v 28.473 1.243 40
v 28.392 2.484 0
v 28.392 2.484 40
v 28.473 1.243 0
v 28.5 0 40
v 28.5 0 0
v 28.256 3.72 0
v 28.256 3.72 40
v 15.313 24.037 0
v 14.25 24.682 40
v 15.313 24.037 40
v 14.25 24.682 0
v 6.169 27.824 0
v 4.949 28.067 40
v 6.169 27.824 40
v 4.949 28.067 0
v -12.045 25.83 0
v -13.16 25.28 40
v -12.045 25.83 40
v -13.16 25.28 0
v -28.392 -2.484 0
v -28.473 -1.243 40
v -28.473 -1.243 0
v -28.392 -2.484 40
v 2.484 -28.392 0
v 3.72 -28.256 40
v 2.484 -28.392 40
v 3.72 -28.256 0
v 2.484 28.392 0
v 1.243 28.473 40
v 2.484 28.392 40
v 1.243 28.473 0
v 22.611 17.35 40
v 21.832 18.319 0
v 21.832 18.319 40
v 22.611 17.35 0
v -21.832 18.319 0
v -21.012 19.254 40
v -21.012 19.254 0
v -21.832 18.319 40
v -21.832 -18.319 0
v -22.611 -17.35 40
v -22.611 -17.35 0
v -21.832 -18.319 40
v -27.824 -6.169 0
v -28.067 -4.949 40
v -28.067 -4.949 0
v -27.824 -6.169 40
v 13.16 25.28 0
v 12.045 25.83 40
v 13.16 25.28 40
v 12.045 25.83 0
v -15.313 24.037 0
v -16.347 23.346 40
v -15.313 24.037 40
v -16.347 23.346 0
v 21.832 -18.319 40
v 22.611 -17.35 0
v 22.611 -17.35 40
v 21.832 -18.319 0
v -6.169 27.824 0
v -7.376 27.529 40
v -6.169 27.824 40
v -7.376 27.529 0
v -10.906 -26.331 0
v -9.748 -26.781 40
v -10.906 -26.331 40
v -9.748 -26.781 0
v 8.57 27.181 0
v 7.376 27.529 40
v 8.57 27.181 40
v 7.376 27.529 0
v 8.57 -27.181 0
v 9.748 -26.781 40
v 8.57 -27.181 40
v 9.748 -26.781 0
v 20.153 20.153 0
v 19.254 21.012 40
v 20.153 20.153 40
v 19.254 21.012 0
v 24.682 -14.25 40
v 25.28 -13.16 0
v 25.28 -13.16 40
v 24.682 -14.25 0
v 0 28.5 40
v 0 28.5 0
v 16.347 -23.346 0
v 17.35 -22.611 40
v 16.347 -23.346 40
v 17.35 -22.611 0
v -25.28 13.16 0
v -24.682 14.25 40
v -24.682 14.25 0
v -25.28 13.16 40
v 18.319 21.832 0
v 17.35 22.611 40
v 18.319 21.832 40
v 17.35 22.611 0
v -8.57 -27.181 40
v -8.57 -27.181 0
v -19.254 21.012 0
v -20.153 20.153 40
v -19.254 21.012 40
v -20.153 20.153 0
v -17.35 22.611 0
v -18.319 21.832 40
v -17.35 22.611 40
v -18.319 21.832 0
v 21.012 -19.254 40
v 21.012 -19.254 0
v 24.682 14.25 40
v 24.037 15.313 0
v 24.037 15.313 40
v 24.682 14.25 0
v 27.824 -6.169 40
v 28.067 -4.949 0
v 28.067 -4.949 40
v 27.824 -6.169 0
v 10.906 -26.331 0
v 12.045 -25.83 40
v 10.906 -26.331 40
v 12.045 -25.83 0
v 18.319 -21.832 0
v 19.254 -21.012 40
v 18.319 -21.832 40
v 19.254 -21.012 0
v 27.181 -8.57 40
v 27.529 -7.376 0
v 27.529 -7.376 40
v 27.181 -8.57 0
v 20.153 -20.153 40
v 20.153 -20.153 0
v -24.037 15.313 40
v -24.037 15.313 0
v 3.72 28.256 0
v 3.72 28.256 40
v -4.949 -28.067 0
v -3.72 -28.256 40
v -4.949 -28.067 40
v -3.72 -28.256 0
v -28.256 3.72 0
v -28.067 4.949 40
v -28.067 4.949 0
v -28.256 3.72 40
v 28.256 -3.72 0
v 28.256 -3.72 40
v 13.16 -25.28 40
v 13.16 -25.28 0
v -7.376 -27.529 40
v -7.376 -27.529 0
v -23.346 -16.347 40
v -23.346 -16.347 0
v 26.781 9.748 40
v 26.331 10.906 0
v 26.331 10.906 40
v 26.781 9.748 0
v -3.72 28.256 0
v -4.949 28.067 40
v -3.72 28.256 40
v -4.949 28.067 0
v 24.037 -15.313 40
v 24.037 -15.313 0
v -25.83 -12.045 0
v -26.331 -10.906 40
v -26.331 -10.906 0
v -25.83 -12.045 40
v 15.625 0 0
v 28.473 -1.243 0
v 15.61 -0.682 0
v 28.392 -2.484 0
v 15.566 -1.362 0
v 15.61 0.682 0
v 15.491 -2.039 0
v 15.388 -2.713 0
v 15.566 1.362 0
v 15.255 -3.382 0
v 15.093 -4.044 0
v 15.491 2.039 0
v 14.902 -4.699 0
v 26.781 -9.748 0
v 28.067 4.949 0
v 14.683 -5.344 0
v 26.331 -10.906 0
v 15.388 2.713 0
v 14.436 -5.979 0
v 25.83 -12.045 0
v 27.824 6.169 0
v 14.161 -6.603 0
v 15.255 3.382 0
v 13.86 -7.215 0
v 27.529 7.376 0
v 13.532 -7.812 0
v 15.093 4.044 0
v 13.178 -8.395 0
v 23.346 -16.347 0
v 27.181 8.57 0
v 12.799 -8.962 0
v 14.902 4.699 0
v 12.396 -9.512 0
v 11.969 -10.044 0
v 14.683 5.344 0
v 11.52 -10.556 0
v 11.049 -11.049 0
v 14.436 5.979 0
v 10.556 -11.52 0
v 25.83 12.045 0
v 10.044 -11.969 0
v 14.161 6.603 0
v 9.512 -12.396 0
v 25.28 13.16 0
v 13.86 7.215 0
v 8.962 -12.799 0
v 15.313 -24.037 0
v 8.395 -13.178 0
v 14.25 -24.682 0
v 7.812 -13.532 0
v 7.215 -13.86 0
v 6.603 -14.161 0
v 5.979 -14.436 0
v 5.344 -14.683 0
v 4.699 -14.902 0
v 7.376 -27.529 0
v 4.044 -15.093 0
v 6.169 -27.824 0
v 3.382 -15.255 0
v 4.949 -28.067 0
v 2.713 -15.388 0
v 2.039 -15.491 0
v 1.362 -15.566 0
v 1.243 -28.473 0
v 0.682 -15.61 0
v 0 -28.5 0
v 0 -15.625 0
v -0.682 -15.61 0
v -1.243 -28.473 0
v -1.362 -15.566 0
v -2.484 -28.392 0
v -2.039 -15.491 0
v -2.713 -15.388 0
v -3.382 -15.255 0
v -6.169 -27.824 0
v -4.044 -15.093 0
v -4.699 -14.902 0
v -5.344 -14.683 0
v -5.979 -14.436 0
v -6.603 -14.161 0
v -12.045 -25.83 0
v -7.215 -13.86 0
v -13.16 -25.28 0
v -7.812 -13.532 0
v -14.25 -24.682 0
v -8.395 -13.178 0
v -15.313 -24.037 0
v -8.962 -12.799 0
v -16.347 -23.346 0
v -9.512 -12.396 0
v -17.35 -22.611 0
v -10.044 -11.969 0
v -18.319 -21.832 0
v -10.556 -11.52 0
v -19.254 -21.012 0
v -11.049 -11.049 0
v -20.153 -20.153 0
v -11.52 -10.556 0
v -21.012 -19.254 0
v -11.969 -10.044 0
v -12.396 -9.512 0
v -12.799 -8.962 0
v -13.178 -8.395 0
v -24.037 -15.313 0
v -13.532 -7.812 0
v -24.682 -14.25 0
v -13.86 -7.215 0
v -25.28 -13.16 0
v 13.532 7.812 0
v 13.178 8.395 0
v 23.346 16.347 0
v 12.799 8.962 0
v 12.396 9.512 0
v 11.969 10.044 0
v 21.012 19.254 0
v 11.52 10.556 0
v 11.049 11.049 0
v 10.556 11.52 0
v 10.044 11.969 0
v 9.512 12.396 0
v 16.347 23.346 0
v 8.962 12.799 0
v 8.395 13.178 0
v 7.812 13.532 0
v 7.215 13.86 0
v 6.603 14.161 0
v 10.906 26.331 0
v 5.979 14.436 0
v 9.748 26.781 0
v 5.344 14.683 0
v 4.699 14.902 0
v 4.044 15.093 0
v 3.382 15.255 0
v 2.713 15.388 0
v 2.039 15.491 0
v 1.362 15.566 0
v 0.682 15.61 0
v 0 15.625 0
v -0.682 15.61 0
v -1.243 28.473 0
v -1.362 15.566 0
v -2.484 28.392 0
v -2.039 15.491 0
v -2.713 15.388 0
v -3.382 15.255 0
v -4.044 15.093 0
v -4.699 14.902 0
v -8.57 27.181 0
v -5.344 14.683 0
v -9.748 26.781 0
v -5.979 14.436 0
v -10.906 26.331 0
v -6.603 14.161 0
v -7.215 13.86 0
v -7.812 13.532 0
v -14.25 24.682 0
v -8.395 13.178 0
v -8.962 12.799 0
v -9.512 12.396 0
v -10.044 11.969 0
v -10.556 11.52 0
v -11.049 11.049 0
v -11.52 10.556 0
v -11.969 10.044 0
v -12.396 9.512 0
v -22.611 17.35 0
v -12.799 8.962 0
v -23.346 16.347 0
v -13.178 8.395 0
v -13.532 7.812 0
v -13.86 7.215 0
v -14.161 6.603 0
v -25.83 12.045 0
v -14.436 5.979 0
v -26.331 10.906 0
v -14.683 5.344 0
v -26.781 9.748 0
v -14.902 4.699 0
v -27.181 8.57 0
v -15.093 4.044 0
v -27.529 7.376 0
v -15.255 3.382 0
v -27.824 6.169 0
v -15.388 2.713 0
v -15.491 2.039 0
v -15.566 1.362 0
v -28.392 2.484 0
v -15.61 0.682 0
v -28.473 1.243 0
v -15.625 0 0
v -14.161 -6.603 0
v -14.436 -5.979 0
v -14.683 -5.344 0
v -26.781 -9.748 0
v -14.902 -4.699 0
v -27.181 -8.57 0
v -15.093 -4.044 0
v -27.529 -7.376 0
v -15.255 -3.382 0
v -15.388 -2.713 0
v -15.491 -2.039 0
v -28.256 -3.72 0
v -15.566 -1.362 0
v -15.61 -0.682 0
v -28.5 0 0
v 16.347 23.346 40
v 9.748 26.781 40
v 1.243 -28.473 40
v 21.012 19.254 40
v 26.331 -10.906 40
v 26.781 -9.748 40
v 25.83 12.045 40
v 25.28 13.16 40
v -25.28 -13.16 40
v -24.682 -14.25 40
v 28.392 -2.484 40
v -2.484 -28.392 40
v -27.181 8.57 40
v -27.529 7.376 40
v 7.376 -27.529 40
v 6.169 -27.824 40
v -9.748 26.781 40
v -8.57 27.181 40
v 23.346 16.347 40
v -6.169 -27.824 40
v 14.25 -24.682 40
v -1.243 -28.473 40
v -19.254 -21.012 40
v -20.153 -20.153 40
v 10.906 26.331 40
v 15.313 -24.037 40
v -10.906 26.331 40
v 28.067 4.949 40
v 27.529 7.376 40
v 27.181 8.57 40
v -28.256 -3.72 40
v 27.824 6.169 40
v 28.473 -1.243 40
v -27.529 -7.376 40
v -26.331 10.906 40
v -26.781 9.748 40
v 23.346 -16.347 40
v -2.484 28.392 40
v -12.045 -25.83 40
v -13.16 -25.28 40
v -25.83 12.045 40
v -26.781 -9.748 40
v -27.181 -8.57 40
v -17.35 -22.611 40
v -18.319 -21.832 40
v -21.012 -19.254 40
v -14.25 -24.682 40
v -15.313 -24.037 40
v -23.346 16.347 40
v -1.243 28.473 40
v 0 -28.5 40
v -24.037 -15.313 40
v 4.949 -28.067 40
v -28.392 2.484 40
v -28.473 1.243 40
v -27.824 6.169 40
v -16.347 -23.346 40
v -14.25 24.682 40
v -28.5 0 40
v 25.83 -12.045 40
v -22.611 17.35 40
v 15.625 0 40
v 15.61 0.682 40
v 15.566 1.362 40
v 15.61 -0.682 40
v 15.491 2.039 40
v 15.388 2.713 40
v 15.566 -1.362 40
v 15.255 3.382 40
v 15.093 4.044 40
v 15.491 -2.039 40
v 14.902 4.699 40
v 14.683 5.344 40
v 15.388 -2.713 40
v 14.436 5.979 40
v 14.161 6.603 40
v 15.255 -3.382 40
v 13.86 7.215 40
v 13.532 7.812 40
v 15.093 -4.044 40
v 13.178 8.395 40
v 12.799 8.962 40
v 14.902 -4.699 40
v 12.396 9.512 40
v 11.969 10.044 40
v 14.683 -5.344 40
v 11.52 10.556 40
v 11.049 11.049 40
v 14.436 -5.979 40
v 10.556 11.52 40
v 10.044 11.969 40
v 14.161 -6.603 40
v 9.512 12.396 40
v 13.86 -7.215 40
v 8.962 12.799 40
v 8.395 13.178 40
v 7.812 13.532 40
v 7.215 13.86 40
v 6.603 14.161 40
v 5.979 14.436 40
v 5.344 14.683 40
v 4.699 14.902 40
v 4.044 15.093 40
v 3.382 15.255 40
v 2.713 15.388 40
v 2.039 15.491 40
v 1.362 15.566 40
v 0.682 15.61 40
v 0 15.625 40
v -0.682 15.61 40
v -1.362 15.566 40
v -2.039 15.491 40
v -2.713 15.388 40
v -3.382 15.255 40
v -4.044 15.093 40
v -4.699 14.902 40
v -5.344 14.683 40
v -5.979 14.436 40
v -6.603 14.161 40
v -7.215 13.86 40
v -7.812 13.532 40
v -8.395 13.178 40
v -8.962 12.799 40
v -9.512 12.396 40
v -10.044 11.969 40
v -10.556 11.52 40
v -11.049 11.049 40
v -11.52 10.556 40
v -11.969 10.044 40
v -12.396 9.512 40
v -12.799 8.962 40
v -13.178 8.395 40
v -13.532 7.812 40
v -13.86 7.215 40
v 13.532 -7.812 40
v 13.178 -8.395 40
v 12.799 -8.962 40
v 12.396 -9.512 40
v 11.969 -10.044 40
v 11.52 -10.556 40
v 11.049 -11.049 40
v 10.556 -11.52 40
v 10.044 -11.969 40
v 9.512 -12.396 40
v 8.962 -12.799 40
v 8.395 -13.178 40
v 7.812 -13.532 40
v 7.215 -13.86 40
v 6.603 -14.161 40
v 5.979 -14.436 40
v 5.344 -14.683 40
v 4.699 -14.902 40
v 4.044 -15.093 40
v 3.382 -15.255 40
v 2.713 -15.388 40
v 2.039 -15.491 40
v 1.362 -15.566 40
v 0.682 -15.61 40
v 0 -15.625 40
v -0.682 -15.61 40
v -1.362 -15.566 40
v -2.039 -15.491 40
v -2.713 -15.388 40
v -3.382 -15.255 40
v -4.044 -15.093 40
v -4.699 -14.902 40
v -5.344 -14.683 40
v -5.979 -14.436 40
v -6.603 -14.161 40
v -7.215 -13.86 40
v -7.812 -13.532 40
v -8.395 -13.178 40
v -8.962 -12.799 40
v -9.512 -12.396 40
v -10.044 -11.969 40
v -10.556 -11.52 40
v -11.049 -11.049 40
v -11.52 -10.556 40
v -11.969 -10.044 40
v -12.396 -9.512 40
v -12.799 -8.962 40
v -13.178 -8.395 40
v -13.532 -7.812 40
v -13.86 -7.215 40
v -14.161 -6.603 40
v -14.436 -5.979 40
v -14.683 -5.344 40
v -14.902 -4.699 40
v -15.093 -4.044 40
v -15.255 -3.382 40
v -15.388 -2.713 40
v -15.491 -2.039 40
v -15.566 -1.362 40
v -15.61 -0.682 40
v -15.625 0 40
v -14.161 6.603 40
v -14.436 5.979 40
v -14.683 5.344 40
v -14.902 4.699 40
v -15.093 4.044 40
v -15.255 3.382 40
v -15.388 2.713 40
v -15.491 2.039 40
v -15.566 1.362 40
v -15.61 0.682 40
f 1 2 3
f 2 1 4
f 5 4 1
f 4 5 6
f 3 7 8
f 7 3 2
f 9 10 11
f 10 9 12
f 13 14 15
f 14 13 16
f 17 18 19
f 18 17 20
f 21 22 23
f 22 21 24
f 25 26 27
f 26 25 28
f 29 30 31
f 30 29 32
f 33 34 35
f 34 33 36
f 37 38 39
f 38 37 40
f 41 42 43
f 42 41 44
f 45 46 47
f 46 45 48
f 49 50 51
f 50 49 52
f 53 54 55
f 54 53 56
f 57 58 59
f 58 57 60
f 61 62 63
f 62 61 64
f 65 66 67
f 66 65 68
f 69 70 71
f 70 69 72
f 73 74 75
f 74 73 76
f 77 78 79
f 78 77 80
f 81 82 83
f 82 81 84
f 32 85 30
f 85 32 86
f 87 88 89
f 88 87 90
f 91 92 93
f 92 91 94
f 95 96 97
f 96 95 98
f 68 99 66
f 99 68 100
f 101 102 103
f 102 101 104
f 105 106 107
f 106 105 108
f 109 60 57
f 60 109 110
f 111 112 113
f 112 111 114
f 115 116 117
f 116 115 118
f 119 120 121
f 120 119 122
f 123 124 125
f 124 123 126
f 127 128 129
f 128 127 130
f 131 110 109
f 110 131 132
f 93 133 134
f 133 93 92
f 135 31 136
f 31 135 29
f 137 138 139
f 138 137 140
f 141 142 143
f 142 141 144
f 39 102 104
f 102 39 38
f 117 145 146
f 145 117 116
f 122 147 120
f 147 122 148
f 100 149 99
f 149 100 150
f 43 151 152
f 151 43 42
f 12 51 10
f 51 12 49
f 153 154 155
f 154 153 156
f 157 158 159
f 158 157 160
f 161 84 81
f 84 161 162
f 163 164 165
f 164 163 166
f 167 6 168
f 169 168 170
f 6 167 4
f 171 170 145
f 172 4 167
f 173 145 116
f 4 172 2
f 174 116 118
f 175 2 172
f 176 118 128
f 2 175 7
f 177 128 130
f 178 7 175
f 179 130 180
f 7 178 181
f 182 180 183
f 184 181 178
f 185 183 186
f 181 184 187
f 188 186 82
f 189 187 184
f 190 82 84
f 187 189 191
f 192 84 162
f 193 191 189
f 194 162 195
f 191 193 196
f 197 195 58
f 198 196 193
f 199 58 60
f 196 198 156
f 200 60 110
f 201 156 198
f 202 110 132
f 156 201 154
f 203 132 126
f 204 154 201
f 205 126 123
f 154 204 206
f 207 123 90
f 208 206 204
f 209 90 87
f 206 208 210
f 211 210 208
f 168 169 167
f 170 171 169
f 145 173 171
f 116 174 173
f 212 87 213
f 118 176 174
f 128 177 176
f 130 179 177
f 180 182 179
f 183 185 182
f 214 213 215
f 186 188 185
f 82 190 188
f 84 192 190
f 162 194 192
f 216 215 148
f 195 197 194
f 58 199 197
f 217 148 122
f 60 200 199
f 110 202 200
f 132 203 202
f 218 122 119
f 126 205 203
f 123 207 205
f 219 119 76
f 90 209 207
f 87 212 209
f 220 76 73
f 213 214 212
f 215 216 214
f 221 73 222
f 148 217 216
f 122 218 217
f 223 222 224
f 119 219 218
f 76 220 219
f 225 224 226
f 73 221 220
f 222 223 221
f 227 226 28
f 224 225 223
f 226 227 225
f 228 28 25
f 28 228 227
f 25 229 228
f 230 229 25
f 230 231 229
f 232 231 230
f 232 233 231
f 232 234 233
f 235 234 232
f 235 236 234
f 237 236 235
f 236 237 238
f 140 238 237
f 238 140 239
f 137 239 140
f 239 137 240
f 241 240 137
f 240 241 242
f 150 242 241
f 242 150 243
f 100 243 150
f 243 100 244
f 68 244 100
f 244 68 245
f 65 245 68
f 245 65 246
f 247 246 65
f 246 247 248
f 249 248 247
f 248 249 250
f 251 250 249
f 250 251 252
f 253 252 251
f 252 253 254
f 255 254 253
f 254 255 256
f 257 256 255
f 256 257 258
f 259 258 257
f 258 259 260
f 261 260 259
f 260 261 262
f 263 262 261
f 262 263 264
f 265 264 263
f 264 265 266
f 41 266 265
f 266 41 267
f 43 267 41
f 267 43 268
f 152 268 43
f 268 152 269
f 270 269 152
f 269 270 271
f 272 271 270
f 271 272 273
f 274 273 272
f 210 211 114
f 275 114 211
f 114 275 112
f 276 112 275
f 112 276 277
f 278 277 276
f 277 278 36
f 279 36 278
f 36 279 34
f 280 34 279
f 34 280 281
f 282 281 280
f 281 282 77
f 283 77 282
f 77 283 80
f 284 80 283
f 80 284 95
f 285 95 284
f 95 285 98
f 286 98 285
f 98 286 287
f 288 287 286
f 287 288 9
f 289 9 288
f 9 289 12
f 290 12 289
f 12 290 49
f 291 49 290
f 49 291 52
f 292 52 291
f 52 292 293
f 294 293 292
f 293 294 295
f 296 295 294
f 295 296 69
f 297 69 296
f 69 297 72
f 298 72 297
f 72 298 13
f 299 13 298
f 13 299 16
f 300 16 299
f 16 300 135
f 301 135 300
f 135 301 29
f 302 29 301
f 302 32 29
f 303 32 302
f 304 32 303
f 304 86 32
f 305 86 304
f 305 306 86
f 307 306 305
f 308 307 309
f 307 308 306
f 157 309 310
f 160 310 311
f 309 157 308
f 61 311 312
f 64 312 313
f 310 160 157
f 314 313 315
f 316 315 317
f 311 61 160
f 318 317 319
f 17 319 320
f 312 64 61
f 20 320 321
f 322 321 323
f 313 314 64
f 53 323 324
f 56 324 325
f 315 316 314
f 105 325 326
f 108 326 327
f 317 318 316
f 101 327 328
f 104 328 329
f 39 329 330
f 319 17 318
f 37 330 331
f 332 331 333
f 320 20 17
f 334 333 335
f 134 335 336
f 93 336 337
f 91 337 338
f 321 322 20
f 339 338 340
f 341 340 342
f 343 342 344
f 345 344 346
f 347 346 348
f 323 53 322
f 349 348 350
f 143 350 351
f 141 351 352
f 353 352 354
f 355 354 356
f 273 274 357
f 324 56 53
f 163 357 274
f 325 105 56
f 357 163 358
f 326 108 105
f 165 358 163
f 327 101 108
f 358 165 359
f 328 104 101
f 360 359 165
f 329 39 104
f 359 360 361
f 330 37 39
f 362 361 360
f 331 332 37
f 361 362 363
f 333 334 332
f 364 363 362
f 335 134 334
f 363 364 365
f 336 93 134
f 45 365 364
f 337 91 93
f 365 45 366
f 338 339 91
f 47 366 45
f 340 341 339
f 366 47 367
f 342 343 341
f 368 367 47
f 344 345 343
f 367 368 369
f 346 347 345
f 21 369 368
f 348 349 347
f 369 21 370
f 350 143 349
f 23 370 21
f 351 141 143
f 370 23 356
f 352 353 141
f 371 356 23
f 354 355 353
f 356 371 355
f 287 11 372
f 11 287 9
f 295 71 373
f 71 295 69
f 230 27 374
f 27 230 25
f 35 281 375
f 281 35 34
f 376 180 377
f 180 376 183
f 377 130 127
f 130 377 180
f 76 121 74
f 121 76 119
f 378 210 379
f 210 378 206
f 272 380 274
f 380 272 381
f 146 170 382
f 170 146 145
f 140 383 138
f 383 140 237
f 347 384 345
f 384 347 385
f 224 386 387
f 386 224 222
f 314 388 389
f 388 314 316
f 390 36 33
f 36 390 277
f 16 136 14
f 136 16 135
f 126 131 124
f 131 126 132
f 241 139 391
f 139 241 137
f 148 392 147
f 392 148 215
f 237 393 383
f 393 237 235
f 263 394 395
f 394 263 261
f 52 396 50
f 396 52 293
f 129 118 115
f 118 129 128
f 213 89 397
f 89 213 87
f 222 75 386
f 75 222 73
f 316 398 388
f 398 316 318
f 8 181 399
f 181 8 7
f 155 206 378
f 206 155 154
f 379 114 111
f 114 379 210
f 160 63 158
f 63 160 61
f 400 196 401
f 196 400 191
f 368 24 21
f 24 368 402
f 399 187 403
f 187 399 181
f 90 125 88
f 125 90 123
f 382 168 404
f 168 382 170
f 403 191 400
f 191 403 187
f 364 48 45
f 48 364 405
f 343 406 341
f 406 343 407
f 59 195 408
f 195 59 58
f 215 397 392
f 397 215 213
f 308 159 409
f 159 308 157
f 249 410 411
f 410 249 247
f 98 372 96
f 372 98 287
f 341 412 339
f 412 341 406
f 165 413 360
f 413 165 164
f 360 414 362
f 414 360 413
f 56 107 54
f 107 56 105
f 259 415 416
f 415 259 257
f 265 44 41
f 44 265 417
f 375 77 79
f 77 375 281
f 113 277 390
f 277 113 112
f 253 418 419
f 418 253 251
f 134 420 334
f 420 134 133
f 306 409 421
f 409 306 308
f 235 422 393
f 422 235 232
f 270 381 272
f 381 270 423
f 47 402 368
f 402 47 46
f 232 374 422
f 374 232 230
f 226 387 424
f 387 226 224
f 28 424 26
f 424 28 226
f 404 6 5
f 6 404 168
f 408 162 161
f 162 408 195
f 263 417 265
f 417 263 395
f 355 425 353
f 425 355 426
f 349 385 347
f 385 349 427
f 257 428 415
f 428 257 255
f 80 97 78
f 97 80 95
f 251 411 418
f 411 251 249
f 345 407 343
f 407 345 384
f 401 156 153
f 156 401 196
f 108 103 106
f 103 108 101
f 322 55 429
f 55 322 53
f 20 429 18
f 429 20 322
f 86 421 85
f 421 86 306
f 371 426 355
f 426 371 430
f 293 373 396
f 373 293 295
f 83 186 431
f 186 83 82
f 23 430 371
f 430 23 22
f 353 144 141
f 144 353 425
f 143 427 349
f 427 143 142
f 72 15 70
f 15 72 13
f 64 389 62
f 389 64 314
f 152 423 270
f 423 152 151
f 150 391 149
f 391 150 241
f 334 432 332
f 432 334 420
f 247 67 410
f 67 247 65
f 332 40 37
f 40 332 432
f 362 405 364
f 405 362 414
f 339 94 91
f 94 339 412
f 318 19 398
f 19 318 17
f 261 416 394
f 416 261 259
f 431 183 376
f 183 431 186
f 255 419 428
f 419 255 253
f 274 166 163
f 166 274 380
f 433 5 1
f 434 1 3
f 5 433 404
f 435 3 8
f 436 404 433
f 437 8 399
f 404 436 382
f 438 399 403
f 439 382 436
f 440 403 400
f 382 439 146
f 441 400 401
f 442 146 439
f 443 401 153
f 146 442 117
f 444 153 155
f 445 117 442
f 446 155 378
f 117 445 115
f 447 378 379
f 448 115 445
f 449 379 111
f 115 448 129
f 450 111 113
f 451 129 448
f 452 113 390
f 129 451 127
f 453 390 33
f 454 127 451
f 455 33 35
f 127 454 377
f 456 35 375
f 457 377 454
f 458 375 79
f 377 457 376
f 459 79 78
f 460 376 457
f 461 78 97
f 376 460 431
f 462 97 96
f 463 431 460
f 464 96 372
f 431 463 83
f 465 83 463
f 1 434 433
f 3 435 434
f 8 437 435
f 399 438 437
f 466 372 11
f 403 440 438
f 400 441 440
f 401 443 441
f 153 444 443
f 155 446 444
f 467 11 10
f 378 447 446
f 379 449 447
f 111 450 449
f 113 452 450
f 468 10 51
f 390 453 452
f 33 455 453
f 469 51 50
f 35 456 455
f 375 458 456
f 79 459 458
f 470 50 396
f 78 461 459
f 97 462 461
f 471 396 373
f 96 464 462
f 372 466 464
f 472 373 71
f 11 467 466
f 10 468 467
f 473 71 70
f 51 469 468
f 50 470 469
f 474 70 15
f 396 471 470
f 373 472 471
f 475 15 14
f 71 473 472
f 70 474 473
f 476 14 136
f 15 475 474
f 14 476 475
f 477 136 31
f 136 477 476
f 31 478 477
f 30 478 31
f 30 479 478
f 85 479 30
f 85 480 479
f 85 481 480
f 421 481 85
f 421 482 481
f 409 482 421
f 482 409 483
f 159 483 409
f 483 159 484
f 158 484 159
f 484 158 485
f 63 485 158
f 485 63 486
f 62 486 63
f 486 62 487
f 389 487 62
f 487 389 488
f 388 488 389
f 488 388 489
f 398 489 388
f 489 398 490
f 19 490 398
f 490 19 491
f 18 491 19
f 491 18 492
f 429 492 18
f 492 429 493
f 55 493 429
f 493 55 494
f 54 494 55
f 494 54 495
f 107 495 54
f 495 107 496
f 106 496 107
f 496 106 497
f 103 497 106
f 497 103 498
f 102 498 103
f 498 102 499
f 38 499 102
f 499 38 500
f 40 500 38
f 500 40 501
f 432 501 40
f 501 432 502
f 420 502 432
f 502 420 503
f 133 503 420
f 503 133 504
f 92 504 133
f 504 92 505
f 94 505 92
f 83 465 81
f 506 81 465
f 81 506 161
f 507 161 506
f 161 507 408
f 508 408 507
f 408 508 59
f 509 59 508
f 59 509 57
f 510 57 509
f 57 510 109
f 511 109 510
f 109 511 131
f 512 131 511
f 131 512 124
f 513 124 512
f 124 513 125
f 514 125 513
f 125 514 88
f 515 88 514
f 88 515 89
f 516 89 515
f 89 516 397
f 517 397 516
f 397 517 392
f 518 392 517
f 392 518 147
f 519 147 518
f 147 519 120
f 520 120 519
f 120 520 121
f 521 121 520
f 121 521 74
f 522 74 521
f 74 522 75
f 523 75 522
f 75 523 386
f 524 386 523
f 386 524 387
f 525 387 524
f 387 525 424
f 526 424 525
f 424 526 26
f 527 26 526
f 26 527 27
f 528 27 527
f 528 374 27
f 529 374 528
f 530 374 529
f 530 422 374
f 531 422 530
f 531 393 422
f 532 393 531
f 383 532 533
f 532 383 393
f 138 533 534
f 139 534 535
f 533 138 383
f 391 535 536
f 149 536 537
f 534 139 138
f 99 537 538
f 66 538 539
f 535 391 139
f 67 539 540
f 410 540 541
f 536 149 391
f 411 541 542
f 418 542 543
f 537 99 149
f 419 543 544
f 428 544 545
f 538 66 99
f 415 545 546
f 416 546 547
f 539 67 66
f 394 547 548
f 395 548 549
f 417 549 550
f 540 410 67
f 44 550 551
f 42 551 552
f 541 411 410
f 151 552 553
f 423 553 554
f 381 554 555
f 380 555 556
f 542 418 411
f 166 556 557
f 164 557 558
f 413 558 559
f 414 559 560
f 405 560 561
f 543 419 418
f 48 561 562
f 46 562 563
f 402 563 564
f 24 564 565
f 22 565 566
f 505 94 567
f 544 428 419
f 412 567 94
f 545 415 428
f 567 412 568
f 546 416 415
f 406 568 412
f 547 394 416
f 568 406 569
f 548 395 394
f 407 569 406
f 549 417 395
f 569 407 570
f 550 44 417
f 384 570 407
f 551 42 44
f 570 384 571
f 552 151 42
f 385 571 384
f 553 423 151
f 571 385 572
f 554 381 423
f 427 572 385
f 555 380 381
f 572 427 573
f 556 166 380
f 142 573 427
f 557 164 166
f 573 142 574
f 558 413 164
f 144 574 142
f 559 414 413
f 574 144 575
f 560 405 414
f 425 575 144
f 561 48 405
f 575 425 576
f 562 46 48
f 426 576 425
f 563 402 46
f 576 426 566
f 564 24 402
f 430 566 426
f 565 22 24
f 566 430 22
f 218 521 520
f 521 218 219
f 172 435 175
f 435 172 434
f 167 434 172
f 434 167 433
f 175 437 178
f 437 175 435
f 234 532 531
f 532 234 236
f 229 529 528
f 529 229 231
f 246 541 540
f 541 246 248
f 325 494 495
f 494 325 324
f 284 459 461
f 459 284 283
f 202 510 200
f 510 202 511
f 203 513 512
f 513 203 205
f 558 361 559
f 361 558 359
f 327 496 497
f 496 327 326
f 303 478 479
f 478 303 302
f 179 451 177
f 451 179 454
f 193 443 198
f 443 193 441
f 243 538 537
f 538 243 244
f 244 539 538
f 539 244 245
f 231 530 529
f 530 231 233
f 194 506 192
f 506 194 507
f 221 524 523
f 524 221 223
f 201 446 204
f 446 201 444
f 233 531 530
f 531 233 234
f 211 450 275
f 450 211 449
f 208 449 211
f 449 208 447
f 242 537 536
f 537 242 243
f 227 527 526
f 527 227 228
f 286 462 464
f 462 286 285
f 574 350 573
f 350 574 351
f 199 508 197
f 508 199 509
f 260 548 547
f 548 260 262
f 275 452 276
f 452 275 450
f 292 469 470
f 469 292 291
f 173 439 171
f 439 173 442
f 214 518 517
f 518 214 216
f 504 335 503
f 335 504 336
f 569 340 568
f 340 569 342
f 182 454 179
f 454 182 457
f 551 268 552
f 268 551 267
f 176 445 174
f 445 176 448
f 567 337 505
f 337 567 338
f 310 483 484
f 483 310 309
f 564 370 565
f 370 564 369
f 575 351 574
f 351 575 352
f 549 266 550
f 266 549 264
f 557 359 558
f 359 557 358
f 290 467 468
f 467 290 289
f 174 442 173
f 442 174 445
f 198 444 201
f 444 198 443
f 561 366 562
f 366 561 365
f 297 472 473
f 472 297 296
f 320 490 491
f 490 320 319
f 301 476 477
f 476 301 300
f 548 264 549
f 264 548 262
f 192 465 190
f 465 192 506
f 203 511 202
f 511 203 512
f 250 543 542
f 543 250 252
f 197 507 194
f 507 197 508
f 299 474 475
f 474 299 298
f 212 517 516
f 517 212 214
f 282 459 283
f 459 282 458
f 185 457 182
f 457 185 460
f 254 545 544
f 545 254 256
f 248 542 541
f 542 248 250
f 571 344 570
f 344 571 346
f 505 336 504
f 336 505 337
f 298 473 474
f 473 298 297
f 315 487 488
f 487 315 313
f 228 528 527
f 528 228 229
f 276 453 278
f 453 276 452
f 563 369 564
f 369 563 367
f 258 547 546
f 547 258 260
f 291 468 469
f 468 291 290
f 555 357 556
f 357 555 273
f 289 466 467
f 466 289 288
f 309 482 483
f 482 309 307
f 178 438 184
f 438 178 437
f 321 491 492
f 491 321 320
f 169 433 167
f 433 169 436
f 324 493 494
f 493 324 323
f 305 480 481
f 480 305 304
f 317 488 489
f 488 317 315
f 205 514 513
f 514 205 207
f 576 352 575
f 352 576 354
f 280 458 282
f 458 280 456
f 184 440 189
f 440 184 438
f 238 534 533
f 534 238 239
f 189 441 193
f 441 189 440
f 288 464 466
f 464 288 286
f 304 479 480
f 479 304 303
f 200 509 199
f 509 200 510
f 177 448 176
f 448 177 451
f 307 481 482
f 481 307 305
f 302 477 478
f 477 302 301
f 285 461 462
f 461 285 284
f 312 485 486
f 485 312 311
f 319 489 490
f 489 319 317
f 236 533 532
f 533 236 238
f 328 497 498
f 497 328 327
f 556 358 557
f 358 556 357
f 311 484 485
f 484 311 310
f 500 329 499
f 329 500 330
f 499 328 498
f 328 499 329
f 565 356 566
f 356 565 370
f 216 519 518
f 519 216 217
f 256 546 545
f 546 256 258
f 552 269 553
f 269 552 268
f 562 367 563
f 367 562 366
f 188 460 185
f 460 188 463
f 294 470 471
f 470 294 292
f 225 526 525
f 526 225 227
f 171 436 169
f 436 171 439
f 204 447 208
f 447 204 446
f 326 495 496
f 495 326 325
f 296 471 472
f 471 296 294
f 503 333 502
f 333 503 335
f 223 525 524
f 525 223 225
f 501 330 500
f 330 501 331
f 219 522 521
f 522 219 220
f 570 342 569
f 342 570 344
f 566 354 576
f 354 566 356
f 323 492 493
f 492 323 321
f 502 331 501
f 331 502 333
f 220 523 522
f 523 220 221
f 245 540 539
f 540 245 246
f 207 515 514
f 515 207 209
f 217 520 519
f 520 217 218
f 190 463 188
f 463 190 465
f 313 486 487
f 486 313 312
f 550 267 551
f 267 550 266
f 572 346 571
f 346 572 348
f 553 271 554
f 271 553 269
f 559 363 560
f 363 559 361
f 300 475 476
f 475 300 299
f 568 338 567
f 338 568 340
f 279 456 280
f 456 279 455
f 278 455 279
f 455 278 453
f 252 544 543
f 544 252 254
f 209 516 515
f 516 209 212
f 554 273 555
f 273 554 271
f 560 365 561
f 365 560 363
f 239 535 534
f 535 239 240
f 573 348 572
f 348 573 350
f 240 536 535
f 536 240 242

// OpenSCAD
// Outer diameter in millimeters - use 57 for standard hose connection for 2 1/4" shop vac
outer = 57;
// Inner diameter in millimeters - use 31.25 for the tapered connector on a 1 1/4" shop vac
inner = 31.25;
// Length of adapter in millimeters
length = 40;

difference() {
cylinder( h=length, r=outer/2, center=false, $fn=144 );
cylinder( h=length, r=inner/2, center=false, $fn=144 );
}
